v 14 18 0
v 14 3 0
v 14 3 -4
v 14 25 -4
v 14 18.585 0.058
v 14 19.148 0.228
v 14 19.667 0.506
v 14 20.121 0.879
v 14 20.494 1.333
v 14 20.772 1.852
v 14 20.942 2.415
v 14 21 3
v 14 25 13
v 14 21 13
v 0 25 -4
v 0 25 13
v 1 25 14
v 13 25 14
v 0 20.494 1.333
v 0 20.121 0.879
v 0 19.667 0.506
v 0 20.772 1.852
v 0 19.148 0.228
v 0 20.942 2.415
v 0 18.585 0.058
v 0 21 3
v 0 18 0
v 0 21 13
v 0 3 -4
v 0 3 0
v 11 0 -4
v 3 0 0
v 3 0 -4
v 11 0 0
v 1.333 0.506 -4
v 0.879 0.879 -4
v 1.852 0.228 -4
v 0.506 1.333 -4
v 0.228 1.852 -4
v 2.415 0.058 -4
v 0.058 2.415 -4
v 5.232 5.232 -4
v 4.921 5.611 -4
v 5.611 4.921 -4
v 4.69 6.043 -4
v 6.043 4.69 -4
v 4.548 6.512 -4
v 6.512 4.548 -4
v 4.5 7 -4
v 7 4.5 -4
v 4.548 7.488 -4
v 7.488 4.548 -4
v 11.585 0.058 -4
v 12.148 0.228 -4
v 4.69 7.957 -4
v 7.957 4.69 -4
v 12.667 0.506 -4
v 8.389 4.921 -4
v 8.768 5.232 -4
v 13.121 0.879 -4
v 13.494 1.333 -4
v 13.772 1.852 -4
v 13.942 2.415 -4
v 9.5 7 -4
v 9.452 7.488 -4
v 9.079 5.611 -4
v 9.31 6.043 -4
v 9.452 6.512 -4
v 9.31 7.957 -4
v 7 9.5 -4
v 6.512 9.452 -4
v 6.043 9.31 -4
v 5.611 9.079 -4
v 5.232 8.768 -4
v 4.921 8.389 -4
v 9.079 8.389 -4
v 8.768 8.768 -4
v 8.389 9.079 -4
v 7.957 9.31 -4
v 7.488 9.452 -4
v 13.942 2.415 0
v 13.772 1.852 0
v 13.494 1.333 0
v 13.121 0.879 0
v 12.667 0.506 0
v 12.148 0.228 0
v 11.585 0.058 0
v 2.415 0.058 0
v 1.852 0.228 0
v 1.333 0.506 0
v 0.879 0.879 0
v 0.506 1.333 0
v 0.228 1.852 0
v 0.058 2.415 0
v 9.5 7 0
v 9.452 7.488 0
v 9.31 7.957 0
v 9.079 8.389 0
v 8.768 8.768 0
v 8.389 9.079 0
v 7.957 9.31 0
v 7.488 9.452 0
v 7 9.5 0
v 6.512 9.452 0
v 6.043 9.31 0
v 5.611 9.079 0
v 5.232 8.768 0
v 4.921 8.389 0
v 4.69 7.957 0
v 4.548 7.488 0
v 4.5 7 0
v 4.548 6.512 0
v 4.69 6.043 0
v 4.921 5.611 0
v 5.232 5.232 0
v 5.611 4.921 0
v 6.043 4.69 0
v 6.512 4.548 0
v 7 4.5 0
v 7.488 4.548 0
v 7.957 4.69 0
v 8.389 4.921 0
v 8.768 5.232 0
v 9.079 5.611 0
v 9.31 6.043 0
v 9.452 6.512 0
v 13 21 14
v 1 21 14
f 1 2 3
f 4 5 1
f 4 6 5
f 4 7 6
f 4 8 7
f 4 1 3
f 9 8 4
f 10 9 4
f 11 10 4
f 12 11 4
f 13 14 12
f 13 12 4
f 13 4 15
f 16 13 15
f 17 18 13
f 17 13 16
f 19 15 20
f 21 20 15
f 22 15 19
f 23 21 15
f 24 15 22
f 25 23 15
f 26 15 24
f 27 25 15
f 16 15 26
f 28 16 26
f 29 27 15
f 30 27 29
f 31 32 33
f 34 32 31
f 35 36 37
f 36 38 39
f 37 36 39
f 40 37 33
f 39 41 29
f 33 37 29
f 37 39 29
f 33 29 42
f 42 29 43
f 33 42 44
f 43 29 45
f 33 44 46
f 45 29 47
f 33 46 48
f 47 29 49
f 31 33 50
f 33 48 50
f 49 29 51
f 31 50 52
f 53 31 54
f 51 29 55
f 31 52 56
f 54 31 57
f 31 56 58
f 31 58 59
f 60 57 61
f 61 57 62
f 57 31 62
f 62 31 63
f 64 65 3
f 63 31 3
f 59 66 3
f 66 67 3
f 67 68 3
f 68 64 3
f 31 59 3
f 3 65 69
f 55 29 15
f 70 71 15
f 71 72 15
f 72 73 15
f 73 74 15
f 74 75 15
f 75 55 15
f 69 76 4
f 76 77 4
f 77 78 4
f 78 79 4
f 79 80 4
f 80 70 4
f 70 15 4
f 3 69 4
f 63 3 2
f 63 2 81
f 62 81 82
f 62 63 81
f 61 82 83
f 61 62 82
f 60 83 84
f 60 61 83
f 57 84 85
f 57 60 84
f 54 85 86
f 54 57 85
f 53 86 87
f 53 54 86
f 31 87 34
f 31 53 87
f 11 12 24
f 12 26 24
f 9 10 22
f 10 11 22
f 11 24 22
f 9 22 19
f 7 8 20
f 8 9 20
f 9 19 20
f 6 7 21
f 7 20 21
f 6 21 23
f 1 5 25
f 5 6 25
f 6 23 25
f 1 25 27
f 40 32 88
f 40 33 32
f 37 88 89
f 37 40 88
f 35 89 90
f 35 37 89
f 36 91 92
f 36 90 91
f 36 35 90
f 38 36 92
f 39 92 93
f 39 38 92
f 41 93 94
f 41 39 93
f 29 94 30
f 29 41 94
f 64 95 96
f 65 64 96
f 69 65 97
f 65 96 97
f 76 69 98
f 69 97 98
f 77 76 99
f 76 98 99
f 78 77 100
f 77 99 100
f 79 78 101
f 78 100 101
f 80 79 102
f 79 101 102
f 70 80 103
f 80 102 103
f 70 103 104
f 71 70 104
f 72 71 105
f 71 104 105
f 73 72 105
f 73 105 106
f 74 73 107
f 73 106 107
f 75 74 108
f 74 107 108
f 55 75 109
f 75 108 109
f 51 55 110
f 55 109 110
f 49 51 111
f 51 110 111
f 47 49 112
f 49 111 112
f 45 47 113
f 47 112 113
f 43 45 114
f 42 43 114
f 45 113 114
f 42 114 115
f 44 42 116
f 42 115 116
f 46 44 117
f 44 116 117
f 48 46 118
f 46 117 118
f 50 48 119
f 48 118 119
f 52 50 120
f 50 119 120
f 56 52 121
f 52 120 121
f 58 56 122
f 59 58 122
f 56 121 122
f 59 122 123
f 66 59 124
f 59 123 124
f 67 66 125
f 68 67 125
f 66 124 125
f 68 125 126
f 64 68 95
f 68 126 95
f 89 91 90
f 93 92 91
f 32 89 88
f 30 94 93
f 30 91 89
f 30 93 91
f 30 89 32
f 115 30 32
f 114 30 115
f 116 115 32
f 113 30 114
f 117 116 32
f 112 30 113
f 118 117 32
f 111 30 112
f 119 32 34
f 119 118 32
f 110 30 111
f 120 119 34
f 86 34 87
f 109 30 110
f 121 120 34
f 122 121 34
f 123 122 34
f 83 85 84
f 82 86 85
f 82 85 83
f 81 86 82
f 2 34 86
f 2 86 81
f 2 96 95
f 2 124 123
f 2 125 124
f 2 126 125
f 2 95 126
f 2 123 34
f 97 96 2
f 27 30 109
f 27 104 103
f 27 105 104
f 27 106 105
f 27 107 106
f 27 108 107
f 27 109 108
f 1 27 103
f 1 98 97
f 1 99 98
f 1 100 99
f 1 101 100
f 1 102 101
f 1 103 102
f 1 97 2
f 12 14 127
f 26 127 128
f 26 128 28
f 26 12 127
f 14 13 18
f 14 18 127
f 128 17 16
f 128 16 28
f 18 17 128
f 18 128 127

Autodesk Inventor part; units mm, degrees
ref_plane "YZ Plane" through (0, 0, 0) normal (1, 0, 0) x (0, 1, 0)
ref_plane "XZ Plane" through (0, 0, 0) normal (0, 1, 0) x (-1, 0, 0)
ref_plane "XY Plane" through (0, 0, 0) normal (0, 0, 1) x (1, 0, 0)
sketch "Náčrt1" plane through (0, 0, 0) normal (0, 0, 1) x (1, 0, 0)
  line L0 (0, 0) -> (14, 0)
  line L1 (14, 0) -> (14, 25)
  line L2 (14, 25) -> (0, 25)
  line L3 (0, 25) -> (0, 0)
  circle A0 centre (7, 7) radius 2.5
  point P0 (7, 0)
  dimension "d0" = 14
  dimension "d1" = 25
  dimension "d2" = 5
  dimension "d3" = 7
  dimension "d4" = 7
extrude "Vysunutí1" add sketch "Náčrt1" against normal blind 4
sketch "Náčrt2" plane through (0, 0, 0) normal (0, 0, 1) x (1, 0, 0)
  line L0 (0, 0) -> (0, 25) projected
  line L1 (14, 25) -> (14, 0) projected
  line L2 (0, 25) -> (14, 25)
  line L3 (14, 25) -> (14, 21)
  line L4 (14, 21) -> (0, 21)
  line L5 (0, 21) -> (0, 25)
  point P0 (0, 21)
  dimension "d7" = 4
extrude "Vysunutí2" add sketch "Náčrt2" along normal blind 14
fillet "Zaoblení1" radius 3 1 edges at (7, 21, 0)
fillet "Zaoblení2" radius 3 2 edges at (0, 0, -2) (14, 0, -2)
chamfer "Zkosení1" distance 1 angle 45 2 edges at (0, 23, 14) (14, 23, 14)
properties part number "Packa" material "Zlatá"
